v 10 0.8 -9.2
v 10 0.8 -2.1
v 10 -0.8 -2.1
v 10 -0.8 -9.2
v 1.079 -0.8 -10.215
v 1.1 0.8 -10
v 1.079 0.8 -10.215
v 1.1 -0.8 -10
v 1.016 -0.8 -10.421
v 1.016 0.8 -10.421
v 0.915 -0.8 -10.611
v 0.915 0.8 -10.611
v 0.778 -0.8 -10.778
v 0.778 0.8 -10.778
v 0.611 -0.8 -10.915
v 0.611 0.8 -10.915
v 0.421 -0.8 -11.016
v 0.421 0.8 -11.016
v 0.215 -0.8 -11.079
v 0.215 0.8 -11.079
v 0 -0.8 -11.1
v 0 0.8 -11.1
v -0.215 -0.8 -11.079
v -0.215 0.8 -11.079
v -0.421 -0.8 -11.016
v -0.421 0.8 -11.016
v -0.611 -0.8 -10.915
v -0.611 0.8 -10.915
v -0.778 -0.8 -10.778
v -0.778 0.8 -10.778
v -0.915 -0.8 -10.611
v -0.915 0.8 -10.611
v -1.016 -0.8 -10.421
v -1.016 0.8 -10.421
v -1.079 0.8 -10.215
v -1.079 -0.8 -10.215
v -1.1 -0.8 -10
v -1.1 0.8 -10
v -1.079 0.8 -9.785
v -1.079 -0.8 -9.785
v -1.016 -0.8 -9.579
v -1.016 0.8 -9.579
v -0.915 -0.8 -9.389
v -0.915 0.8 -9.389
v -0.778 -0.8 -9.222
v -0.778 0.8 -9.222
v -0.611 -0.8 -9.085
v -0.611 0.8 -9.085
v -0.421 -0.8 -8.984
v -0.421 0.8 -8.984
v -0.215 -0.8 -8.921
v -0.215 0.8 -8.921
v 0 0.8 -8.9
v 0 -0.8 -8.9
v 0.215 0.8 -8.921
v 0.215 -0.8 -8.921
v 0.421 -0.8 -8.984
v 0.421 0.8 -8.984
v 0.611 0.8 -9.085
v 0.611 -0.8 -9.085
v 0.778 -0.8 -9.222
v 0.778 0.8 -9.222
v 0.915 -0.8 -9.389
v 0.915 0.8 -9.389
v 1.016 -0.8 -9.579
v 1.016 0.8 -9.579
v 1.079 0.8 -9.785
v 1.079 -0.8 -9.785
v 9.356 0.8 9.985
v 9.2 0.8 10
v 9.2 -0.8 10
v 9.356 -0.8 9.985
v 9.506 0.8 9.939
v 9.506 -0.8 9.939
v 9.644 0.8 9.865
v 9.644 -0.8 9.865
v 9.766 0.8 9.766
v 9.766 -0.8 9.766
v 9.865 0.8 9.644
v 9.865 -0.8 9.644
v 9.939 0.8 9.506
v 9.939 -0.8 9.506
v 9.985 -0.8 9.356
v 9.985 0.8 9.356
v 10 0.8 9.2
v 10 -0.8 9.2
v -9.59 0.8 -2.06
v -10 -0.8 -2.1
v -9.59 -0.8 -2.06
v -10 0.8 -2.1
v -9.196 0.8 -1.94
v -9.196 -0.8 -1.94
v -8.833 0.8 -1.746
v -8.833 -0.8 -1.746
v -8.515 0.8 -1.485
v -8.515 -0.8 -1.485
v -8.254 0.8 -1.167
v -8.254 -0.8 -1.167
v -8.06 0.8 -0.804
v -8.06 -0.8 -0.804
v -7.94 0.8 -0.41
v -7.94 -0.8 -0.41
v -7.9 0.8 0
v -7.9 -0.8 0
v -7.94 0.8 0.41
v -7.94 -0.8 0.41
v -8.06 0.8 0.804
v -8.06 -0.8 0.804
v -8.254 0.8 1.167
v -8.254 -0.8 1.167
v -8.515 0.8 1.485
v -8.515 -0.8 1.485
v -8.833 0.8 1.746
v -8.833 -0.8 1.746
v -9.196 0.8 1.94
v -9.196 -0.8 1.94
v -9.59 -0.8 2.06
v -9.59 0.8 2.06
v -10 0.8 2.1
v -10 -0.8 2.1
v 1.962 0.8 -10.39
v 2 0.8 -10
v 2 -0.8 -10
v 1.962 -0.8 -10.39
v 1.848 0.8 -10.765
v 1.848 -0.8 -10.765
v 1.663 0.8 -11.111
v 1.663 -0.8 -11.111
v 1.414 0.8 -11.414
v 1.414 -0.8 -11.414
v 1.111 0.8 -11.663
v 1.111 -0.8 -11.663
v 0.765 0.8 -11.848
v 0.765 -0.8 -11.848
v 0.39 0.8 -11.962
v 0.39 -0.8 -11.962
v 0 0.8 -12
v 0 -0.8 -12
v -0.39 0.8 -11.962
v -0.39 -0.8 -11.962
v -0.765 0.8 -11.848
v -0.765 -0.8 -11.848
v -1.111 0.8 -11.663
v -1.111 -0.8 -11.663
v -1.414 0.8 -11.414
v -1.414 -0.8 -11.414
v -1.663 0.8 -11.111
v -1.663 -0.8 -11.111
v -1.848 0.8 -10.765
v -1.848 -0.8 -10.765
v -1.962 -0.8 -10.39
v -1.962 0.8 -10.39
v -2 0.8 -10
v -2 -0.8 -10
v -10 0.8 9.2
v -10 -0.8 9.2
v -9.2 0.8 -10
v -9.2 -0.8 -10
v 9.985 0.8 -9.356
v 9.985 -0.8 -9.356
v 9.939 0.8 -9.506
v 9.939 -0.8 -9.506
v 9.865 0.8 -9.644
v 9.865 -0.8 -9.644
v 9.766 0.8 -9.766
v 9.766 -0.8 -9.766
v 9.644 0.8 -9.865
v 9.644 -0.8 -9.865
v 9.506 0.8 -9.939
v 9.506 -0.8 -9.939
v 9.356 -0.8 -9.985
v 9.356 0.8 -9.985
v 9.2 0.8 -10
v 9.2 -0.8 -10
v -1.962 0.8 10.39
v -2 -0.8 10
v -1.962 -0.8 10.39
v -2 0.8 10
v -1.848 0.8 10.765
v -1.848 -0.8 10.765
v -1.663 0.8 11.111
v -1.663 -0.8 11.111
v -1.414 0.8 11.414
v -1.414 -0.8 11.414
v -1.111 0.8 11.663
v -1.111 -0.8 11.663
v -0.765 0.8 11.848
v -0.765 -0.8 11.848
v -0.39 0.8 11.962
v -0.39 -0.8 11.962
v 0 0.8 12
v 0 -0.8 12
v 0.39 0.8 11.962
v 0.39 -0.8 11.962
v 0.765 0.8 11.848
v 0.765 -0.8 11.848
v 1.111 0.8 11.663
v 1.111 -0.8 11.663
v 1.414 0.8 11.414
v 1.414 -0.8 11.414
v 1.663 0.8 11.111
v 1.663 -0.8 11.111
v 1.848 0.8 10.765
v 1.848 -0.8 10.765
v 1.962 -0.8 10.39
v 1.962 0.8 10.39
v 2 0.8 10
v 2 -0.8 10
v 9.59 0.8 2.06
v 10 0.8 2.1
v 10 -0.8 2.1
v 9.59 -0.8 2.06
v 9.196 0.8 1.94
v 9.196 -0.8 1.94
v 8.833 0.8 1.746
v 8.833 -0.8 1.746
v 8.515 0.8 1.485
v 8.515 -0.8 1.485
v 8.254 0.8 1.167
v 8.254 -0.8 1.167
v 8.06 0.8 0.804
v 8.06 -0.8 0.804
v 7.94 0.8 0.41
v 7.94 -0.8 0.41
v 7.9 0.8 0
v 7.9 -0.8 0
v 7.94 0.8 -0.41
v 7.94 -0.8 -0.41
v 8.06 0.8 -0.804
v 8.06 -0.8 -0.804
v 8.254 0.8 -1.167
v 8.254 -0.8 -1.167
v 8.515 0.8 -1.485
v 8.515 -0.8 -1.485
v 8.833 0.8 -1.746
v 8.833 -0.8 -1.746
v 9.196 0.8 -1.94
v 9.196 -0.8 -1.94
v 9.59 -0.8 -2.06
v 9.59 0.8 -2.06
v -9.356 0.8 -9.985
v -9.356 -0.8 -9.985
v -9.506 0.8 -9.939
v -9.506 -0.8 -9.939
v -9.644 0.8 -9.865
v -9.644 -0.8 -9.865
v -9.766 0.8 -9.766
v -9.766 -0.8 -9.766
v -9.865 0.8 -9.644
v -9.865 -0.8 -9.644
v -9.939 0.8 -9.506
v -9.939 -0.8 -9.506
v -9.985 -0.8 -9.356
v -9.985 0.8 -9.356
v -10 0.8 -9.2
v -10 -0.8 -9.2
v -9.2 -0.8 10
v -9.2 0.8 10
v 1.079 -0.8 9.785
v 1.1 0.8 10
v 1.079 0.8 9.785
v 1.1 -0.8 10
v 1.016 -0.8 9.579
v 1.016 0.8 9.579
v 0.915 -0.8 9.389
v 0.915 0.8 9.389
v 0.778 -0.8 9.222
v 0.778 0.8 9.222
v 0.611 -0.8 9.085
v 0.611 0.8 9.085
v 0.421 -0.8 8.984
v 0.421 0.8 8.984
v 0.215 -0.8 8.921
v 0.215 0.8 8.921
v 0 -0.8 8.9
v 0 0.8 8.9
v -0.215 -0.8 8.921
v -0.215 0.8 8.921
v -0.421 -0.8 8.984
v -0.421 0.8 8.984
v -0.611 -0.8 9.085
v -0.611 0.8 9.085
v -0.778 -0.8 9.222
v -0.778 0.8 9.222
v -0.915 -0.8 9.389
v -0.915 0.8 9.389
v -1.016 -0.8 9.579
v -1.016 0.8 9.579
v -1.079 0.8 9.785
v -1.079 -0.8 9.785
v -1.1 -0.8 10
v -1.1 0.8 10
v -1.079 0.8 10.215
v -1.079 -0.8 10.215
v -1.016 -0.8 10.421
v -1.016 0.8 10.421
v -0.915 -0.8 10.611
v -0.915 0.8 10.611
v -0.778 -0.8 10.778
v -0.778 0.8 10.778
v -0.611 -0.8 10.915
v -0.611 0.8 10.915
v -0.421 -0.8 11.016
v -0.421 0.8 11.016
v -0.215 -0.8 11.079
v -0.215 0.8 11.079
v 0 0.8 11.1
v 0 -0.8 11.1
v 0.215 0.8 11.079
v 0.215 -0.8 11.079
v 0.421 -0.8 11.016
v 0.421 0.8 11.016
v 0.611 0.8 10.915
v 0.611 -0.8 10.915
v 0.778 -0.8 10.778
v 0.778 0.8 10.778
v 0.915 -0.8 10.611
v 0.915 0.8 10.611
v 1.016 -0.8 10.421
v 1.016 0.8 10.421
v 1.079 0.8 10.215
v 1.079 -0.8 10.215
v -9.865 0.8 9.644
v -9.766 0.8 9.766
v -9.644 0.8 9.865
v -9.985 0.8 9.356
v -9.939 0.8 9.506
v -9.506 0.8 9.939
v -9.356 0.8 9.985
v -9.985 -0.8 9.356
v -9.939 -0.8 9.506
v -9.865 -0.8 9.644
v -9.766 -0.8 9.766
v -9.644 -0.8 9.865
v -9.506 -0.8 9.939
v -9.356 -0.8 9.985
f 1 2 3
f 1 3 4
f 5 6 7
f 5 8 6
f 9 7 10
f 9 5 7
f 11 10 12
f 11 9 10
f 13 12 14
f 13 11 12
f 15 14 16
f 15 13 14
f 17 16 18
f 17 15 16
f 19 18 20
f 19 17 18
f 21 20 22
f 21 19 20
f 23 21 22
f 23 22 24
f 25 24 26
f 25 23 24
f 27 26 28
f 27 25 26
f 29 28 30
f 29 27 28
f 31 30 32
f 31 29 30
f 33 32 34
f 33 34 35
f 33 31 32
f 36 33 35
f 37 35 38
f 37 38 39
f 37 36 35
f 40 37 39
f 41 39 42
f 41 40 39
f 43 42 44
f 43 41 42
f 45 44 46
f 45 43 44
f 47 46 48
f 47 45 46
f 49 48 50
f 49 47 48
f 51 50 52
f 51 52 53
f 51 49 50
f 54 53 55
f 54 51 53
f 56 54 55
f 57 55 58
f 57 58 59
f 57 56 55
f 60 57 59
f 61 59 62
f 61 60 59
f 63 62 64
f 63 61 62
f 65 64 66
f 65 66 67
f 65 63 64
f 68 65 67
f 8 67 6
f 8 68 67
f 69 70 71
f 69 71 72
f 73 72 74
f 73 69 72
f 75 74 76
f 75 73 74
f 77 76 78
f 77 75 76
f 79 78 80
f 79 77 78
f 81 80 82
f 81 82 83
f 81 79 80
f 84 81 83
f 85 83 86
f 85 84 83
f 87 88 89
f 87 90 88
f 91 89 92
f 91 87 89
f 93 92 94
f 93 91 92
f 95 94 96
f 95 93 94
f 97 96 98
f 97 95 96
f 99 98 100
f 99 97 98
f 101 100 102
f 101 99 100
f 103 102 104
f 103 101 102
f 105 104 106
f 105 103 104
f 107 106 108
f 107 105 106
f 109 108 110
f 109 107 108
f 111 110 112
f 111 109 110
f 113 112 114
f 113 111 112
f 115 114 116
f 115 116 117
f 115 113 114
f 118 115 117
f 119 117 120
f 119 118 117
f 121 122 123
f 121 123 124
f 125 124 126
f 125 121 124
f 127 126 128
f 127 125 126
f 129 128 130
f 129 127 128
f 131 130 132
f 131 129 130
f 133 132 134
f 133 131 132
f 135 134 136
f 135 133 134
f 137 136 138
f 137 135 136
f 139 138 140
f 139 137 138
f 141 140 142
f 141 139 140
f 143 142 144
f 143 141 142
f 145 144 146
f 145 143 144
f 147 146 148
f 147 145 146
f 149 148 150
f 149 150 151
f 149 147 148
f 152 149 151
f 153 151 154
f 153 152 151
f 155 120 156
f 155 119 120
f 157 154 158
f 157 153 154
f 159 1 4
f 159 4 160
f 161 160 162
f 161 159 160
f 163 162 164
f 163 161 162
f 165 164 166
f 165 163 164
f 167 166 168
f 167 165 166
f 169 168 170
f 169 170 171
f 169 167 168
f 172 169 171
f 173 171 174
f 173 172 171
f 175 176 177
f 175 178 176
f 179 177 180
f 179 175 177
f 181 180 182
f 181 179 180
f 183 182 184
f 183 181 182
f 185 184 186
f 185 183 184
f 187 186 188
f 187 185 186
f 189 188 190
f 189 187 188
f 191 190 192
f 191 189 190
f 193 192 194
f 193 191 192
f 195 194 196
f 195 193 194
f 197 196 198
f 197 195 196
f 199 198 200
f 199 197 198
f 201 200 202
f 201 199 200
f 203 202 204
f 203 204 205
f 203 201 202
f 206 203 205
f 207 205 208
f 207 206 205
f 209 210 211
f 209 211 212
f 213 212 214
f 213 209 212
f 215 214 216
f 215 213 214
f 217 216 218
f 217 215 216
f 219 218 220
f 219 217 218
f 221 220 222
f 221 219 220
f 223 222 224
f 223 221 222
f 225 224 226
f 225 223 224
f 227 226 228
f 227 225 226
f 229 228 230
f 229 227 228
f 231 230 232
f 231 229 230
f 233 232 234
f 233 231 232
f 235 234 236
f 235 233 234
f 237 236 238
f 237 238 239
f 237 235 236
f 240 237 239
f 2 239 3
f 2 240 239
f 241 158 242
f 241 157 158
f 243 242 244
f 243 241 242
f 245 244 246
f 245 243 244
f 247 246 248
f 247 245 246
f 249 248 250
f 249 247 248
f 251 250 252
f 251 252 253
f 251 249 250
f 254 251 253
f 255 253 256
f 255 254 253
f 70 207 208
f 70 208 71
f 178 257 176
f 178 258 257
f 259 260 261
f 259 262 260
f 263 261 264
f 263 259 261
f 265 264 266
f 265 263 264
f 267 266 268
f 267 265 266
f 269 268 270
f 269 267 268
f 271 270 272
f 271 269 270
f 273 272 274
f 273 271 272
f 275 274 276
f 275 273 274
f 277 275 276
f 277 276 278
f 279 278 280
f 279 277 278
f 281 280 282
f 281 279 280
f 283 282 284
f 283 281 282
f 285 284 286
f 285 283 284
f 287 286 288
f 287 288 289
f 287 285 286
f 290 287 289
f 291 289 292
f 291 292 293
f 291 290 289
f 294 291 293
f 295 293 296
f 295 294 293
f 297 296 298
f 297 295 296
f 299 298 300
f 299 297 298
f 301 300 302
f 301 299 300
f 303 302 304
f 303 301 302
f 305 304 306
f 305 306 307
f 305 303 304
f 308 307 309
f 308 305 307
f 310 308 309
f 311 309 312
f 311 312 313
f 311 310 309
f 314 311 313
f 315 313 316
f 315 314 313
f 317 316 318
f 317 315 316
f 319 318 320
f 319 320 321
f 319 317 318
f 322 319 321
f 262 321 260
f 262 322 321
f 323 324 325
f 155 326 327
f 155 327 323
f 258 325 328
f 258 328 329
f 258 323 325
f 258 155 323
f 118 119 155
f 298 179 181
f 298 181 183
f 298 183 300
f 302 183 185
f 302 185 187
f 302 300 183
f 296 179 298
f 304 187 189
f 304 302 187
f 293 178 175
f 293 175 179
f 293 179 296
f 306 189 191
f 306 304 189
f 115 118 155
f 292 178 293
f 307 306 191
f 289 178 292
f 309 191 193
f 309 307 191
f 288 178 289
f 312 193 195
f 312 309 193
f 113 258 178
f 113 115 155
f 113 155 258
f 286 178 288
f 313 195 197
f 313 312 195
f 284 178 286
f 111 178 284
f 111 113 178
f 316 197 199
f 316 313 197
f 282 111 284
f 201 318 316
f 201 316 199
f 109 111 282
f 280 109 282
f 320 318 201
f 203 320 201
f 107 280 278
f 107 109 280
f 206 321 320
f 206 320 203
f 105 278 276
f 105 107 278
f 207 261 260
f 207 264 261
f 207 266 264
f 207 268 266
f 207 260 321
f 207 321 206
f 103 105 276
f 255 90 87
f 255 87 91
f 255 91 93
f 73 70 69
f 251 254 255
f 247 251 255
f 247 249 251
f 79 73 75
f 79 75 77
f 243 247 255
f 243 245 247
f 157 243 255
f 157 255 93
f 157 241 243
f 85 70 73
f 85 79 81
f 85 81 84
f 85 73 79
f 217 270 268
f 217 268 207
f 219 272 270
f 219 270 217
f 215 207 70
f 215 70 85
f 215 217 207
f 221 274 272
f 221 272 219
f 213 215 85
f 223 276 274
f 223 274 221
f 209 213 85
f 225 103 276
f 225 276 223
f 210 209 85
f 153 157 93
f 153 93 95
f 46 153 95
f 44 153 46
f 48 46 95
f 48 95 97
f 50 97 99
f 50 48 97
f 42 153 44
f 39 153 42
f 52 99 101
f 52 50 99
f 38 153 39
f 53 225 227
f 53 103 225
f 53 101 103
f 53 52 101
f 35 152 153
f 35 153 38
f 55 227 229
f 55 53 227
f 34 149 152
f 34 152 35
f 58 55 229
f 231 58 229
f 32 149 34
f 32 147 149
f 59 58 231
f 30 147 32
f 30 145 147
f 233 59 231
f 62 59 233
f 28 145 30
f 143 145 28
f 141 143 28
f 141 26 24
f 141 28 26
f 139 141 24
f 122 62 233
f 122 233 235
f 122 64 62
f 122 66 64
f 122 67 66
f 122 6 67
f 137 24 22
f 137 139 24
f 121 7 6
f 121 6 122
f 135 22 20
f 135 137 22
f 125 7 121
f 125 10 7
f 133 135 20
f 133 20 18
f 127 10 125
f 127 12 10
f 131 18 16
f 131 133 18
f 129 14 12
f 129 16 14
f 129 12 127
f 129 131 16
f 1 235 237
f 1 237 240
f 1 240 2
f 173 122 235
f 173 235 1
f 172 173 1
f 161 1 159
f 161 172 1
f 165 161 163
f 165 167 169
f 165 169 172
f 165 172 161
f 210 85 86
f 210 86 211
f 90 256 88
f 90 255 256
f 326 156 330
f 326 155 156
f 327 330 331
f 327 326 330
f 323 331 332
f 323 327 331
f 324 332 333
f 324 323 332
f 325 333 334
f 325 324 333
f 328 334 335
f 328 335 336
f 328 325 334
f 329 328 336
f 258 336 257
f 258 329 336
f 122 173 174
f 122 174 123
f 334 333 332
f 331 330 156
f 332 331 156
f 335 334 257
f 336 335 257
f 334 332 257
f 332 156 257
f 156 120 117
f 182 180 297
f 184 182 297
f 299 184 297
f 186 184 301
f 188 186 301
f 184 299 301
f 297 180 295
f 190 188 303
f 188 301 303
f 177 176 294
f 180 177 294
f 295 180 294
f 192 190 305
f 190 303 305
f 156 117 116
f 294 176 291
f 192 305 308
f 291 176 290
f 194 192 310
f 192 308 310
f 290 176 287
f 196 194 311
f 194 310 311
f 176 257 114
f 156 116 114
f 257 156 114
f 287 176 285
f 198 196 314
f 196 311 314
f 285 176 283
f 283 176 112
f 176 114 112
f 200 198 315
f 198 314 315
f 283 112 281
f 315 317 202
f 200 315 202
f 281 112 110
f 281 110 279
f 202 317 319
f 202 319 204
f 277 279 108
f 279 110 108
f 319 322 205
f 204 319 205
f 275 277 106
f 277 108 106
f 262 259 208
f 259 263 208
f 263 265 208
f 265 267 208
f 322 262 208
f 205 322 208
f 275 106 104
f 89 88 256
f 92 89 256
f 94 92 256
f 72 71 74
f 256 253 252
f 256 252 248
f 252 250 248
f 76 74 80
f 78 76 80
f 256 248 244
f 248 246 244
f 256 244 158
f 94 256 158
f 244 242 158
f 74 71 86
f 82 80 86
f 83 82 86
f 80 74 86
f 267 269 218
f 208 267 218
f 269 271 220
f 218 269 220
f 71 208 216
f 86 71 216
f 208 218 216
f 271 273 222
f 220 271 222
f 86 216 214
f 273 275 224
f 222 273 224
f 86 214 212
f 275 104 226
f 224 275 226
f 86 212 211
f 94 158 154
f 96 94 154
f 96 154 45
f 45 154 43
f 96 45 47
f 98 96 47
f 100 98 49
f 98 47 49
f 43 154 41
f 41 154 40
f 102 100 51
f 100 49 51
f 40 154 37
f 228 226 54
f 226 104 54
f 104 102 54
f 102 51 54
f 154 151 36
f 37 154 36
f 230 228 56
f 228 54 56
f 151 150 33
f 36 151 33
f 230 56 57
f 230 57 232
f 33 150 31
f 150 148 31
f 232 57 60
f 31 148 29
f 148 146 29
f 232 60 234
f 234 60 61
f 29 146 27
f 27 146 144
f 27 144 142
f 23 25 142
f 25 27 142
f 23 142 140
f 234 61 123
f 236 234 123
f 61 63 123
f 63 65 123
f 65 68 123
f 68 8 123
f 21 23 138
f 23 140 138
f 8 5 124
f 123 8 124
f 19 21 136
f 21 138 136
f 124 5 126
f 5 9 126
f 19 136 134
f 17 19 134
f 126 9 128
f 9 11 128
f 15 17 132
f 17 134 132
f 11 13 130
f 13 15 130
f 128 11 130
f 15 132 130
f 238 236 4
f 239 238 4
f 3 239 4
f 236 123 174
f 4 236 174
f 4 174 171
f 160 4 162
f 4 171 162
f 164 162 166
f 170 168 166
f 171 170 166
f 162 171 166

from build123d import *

# Parameters (mm, degrees)
ESQUISSE1_R        = 1.1
BOSS_EXTRU_1_DEPTH = 0.8


with BuildPart() as part:
    # Esquisse1 → Boss.-Extru.1 (new body, symmetric)
    with BuildSketch(Plane(origin=(0, 0, 0), x_dir=(1, 0, 0), z_dir=(0, 1, 0))):
        with BuildLine():
            ThreePointArc((-2, -10), (0, -12), (2, -10))
            Line((2, -10), (9.2, -10))
            ThreePointArc((9.2, -10), (9.765685425, -9.765685425), (10, -9.2))
            Line((10, -9.2), (10, -2.1))
            ThreePointArc((10, -2.1), (7.9, 0), (10, 2.1))
            Line((10, 2.1), (10, 9.2))
            ThreePointArc((10, 9.2), (9.765685425, 9.765685425), (9.2, 10))
            Line((9.2, 10), (2, 10))
            ThreePointArc((2, 10), (0, 12), (-2, 10))
            Line((-2, 10), (-9.2, 10))
            ThreePointArc((-9.2, 10), (-9.765685425, 9.765685425), (-10, 9.2))
            Line((-10, 9.2), (-10, 2.1))
            ThreePointArc((-10, 2.1), (-7.9, 0), (-10, -2.1))
            Line((-10, -2.1), (-10, -9.2))
            ThreePointArc((-10, -9.2), (-9.765685425, -9.765685425), (-9.2, -10))
            Line((-9.2, -10), (-2, -10))
        make_face()
        with Locations((0, -10)):
            Circle(ESQUISSE1_R, mode=Mode.SUBTRACT)
        with Locations((0, 10)):
            Circle(ESQUISSE1_R, mode=Mode.SUBTRACT)
    extrude(amount=BOSS_EXTRU_1_DEPTH, both=True)


solid = part.part
